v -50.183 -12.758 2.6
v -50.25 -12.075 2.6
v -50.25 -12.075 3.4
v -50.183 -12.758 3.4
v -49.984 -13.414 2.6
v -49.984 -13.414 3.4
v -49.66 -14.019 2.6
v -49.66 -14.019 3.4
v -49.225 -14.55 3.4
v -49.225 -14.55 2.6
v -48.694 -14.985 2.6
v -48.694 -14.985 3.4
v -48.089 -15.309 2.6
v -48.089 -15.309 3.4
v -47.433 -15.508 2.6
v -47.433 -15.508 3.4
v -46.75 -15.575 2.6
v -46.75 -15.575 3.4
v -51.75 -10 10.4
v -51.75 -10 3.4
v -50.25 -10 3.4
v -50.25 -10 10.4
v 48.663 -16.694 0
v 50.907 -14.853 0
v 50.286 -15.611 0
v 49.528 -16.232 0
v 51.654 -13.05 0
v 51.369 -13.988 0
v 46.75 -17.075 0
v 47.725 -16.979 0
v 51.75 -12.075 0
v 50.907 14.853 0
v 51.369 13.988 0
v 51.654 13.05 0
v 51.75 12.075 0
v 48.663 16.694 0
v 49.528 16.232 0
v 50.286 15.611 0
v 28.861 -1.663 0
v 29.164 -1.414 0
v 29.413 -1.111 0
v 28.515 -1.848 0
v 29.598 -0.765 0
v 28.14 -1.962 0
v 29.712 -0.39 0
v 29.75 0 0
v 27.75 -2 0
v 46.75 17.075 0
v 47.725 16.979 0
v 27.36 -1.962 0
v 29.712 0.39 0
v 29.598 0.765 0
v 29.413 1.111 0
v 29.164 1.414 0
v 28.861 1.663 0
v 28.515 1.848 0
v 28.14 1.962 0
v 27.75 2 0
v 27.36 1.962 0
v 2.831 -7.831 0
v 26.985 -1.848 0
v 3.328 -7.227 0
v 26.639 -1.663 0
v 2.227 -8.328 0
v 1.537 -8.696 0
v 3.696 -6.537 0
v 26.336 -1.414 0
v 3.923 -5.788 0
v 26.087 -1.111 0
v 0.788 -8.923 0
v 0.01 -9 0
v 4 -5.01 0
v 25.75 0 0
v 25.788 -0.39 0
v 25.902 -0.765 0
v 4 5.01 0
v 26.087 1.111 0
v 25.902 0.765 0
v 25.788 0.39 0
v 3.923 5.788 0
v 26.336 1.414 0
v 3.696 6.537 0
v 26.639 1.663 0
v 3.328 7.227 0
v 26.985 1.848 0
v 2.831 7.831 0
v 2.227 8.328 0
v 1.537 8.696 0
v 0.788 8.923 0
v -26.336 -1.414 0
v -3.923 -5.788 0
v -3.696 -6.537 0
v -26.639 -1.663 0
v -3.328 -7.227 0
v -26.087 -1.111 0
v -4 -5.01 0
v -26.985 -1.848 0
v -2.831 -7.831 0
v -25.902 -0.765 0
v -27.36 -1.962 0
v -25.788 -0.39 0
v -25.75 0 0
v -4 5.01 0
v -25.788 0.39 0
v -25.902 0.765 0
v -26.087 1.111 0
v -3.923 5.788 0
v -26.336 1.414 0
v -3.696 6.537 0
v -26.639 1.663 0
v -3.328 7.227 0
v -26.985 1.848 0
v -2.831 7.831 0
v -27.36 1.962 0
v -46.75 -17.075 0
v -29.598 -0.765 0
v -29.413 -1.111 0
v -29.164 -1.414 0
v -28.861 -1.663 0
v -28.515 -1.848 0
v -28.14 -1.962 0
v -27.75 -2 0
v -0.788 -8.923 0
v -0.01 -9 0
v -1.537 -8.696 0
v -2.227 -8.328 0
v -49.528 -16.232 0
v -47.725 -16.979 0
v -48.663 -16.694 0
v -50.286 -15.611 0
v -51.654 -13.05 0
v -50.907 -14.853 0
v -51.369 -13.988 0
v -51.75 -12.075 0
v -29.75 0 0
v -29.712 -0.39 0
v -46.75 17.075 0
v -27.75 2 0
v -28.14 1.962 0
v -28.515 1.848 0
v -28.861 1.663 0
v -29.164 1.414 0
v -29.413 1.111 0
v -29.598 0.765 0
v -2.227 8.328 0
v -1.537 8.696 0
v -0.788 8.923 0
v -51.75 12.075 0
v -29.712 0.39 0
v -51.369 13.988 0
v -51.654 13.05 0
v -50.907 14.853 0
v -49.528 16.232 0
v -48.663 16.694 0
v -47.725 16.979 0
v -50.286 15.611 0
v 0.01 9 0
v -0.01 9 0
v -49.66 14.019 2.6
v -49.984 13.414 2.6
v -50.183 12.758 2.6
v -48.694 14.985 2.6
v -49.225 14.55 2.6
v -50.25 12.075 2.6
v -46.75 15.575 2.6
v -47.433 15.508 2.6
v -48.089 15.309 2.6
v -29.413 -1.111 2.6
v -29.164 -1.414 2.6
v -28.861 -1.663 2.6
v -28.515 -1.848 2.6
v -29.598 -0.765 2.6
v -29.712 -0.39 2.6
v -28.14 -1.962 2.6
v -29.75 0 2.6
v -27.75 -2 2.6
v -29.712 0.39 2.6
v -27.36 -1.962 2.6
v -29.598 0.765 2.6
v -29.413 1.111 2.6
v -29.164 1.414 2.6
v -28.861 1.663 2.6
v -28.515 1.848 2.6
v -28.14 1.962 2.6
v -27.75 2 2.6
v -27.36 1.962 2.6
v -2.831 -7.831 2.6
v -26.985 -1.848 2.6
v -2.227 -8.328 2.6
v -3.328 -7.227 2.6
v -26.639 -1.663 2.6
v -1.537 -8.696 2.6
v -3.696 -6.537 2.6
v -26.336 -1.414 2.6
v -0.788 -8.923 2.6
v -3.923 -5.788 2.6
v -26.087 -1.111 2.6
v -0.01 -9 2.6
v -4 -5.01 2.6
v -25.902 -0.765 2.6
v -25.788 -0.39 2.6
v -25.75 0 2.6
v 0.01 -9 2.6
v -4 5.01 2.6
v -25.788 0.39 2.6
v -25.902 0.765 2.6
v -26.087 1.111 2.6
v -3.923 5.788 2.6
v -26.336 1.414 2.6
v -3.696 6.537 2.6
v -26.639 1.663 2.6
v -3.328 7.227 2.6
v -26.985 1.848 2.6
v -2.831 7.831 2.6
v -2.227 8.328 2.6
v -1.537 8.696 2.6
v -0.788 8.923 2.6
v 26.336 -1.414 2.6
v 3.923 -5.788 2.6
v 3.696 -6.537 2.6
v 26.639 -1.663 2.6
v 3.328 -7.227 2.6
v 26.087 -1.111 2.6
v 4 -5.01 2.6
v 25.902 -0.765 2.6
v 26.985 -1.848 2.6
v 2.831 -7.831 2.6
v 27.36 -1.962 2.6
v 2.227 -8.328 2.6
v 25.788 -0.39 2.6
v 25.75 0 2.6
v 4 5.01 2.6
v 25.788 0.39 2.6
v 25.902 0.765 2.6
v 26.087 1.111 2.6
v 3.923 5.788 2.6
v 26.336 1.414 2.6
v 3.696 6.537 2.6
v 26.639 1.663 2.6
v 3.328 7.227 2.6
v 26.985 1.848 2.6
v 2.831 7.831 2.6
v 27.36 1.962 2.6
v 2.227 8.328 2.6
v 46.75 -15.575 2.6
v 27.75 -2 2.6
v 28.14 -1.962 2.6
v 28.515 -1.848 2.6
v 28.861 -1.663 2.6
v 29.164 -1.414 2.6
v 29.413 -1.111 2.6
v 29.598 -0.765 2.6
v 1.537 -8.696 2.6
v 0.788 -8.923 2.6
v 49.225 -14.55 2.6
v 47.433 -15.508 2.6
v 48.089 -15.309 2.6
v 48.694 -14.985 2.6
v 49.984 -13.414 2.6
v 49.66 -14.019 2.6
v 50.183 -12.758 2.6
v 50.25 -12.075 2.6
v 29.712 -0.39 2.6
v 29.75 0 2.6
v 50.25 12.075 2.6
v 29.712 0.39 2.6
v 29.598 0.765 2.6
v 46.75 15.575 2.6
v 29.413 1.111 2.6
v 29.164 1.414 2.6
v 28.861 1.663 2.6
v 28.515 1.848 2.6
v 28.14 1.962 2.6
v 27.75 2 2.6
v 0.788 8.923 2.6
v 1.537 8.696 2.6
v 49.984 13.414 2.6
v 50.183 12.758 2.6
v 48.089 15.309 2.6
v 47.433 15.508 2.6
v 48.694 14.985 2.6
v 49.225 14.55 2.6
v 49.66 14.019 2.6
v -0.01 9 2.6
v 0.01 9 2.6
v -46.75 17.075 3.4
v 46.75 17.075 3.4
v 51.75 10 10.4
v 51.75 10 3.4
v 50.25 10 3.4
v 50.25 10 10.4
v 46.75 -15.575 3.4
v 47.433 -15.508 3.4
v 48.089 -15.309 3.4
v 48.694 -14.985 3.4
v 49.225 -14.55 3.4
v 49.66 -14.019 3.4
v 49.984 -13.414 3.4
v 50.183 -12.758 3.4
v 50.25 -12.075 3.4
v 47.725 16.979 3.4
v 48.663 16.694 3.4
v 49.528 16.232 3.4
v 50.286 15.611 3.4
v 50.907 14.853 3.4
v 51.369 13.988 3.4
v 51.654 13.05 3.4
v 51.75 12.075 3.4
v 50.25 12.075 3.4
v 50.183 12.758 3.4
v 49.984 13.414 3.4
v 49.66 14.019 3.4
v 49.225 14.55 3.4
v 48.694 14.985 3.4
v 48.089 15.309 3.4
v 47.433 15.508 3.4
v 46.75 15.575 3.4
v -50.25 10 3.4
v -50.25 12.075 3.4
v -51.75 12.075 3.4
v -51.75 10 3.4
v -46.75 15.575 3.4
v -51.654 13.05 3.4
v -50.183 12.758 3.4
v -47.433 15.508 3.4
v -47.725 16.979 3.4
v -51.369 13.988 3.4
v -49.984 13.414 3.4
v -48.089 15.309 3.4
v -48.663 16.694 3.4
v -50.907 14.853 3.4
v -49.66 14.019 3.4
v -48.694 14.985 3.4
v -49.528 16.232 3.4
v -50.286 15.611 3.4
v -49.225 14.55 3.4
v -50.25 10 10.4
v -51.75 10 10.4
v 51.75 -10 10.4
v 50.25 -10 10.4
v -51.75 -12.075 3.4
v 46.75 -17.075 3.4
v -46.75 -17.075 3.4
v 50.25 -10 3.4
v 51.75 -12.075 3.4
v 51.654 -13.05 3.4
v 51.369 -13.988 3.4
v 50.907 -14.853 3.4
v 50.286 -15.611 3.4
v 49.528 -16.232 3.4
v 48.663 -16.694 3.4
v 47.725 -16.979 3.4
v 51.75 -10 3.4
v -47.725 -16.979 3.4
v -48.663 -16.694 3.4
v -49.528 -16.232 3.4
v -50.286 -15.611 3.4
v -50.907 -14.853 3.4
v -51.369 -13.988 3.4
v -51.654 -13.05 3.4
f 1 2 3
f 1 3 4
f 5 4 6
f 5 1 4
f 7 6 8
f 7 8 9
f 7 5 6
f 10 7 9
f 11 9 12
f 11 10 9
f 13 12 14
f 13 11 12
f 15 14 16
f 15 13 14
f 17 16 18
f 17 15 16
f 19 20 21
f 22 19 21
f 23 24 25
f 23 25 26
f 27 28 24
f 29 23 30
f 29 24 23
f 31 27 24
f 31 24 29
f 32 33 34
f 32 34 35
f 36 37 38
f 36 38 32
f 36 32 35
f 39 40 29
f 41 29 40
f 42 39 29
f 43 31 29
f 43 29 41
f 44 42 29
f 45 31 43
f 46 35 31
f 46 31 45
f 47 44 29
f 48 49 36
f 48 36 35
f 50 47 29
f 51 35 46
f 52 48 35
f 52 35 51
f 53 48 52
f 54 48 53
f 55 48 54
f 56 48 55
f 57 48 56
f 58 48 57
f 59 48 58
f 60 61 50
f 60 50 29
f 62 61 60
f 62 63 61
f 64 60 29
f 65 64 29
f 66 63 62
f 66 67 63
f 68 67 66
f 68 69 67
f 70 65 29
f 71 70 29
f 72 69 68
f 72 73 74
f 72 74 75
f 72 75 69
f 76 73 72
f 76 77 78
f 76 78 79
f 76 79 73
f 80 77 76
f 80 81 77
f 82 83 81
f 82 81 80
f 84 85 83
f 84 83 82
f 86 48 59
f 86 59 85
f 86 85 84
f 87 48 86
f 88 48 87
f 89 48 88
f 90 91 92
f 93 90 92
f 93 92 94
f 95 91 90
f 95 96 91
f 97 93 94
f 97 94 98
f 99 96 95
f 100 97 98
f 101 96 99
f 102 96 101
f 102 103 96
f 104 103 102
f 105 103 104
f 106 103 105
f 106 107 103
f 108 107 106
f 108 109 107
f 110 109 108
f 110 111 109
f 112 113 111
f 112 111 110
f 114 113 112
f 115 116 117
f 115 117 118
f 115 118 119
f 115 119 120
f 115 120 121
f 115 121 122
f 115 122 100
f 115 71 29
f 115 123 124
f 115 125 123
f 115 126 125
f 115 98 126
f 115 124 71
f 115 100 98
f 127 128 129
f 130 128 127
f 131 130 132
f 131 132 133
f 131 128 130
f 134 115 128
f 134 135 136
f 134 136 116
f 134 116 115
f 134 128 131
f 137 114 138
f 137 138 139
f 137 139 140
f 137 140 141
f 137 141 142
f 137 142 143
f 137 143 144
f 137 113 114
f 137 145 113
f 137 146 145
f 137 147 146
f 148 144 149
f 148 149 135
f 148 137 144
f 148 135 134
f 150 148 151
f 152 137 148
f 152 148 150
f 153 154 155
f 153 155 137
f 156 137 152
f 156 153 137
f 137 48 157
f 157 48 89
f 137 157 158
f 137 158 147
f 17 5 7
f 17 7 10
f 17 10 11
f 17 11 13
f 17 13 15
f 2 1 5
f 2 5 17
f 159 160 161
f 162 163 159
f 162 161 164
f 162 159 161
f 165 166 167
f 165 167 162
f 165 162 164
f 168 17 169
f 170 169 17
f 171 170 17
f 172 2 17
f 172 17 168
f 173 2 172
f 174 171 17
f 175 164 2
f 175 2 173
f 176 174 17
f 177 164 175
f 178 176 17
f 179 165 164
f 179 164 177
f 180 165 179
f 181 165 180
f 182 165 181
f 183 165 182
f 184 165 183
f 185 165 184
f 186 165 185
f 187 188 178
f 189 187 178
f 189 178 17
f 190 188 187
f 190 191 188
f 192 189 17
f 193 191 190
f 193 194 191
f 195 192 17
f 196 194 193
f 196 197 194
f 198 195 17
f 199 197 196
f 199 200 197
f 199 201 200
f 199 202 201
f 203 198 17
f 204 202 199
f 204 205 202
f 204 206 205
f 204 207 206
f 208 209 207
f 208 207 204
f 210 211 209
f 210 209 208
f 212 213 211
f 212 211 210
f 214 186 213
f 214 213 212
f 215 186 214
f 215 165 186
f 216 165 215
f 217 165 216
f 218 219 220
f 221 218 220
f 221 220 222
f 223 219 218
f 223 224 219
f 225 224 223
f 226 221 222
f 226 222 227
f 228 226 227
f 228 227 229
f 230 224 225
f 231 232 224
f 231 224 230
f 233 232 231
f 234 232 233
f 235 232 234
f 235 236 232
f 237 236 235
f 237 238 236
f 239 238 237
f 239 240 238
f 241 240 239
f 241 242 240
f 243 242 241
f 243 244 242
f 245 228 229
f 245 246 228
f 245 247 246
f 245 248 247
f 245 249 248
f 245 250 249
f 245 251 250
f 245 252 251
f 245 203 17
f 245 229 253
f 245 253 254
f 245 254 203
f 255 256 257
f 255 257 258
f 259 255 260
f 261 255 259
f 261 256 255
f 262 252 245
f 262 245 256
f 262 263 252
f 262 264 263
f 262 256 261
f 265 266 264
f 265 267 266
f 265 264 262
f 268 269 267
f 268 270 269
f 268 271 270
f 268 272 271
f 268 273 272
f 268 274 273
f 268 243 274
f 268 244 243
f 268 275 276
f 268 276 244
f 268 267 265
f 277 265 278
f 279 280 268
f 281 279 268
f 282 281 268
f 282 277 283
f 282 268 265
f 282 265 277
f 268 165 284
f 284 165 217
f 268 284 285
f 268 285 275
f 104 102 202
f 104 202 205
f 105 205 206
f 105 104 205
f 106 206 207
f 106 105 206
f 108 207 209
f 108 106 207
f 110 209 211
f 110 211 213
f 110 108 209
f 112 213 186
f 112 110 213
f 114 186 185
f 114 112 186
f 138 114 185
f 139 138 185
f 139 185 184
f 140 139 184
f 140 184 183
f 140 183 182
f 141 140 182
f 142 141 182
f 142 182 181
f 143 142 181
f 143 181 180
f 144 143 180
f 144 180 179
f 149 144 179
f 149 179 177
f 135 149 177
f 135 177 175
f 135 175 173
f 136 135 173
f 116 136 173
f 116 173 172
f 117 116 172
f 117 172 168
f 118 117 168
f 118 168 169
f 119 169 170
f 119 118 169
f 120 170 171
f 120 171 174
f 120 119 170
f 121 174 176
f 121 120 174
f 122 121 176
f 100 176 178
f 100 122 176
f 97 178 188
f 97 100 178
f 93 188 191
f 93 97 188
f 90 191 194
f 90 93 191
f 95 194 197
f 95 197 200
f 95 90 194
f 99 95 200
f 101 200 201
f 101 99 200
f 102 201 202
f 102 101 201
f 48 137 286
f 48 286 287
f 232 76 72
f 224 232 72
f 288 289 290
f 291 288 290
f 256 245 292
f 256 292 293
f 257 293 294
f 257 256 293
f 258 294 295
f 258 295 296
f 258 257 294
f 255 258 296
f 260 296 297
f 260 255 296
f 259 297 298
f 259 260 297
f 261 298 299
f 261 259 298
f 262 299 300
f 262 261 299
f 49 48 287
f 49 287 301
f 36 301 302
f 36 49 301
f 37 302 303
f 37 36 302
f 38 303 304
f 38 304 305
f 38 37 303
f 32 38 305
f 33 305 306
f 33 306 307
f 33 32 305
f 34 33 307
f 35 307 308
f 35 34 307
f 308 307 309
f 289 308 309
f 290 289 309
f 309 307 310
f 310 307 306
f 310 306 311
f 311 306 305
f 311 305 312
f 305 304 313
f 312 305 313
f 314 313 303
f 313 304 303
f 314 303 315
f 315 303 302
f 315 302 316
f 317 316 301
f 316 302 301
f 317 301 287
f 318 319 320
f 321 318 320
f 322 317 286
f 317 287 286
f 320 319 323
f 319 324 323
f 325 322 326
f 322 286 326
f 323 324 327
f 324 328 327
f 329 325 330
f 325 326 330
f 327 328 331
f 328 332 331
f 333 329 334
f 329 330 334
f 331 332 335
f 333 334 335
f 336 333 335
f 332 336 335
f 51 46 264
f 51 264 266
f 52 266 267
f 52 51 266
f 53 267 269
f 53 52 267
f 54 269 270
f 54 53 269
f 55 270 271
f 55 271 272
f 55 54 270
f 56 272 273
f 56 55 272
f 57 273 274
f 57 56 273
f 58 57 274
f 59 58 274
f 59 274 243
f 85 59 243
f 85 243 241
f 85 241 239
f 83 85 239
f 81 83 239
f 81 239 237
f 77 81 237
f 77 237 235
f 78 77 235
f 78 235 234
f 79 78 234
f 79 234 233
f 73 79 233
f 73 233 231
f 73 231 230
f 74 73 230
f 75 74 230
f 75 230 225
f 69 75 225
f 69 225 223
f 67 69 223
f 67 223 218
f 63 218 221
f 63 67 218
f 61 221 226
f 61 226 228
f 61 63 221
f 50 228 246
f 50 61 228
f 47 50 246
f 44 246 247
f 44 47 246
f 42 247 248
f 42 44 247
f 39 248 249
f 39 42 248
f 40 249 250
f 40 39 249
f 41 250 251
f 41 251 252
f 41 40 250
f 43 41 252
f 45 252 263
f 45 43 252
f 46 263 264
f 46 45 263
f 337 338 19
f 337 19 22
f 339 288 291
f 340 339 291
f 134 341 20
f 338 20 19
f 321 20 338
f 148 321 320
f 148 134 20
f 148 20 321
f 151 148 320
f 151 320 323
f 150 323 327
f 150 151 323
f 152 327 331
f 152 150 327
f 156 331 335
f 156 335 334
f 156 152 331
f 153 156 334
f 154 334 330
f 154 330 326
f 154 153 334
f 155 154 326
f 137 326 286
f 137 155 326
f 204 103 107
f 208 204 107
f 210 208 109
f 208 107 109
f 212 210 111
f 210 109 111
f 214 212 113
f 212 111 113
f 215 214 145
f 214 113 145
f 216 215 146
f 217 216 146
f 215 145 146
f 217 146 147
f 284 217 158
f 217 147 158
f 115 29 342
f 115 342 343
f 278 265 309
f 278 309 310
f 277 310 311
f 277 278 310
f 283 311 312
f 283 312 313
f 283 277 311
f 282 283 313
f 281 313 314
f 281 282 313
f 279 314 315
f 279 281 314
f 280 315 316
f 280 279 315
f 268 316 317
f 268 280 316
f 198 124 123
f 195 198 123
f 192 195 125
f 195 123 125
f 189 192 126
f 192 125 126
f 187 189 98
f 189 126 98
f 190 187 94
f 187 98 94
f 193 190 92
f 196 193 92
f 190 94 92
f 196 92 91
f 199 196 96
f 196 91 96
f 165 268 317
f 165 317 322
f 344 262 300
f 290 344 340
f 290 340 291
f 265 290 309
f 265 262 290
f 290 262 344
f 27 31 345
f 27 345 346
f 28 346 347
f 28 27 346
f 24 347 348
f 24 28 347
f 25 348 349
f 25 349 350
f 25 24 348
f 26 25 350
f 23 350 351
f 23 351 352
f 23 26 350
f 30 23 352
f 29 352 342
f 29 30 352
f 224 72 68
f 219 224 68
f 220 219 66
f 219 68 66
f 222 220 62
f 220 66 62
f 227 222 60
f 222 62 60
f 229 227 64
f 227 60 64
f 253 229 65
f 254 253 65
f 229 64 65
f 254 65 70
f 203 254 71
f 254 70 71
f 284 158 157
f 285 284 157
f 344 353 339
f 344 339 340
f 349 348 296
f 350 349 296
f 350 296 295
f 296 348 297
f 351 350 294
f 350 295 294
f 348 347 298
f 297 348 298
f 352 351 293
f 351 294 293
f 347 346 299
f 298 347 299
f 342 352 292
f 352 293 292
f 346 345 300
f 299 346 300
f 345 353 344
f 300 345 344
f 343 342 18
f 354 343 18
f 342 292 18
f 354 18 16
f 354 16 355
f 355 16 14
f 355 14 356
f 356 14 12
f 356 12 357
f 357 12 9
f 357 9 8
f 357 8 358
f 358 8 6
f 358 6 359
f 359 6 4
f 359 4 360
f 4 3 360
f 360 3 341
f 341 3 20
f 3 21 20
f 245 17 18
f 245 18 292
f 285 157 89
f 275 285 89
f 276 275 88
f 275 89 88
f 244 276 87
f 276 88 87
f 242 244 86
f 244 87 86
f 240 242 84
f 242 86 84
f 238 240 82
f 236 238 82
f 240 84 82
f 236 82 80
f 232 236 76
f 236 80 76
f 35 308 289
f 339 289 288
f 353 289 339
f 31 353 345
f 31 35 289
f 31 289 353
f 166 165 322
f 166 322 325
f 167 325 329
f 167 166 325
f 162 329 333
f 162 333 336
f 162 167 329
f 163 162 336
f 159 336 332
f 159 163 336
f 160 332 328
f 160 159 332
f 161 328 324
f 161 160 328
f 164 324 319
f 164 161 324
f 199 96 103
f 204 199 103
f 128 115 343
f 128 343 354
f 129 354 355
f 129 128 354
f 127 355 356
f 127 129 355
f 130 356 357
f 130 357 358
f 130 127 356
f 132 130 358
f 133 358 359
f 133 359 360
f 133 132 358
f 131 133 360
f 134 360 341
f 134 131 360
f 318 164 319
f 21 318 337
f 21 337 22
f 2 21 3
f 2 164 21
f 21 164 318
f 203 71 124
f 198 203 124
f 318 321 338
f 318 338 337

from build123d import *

# Parameters (mm, degrees)
SKETCH1_R           = 2
BOSS_EXTRUDE1_DEPTH = 3.4
CUT_EXTRUDE1_START  = -0.8
SKETCH2_R           = 2
CUT_EXTRUDE1_DEPTH  = 0.8
SKETCH3_W           = 1.5
SKETCH3_H           = 20
BOSS_EXTRUDE2_DEPTH = 7


with BuildPart() as part:
    # Sketch1 → Boss-Extrude1 (new body)
    with BuildSketch(Plane.XY):
        with BuildLine():
            Line((-46.75, 17.075), (46.75, 17.075))
            ThreePointArc((46.75, 17.075), (50.285533906, 15.610533906), (51.75, 12.075))
            Line((51.75, 12.075), (51.75, -12.075))
            ThreePointArc((51.75, -12.075), (50.285533906, -15.610533906), (46.75, -17.075))
            Line((46.75, -17.075), (-46.75, -17.075))
            ThreePointArc((-46.75, -17.075), (-50.285533906, -15.610533906), (-51.75, -12.075))
            Line((-51.75, -12.075), (-51.75, 12.075))
            ThreePointArc((-51.75, 12.075), (-50.285533906, 15.610533906), (-46.75, 17.075))
        make_face()
        with Locations((-27.75, 0)):
            Circle(SKETCH1_R, mode=Mode.SUBTRACT)
        with Locations((27.75, 0)):
            Circle(SKETCH1_R, mode=Mode.SUBTRACT)
        with BuildLine():
            Line((-0.01, 9), (0.01, 9))
            ThreePointArc((0.01, 9), (2.831356057, 7.831356057), (4, 5.01))
            Line((4, 5.01), (4, -5.01))
            ThreePointArc((4, -5.01), (2.831356057, -7.831356057), (0.01, -9))
            Line((0.01, -9), (-0.01, -9))
            ThreePointArc((-0.01, -9), (-2.831356057, -7.831356057), (-4, -5.01))
            Line((-4, -5.01), (-4, 5.01))
            ThreePointArc((-4, 5.01), (-2.831356057, 7.831356057), (-0.01, 9))
        make_face(mode=Mode.SUBTRACT)
    extrude(amount=BOSS_EXTRUDE1_DEPTH)

    # Sketch2 → Cut-Extrude1 (cut)
    with BuildSketch(Plane.XY.offset(3.4).offset(CUT_EXTRUDE1_START)):
        with BuildLine():
            Line((50.25, -12.075), (50.25, 12.075))
            ThreePointArc((50.25, 12.075), (49.224873734, 14.549873734), (46.75, 15.575))
            Line((46.75, 15.575), (-46.75, 15.575))
            ThreePointArc((-46.75, 15.575), (-49.224873734, 14.549873734), (-50.25, 12.075))
            Line((-50.25, 12.075), (-50.25, -12.075))
            ThreePointArc((-50.25, -12.075), (-49.224873734, -14.549873734), (-46.75, -15.575))
            Line((-46.75, -15.575), (46.75, -15.575))
            ThreePointArc((46.75, -15.575), (49.224873734, -14.549873734), (50.25, -12.075))
        make_face()
        with Locations((-27.75, 0)):
            Circle(SKETCH2_R, mode=Mode.SUBTRACT)
        with Locations((27.75, 0)):
            Circle(SKETCH2_R, mode=Mode.SUBTRACT)
        with BuildLine():
            ThreePointArc((0.01, 9), (2.831356057, 7.831356057), (4, 5.01))
            Line((4, 5.01), (4, -5.01))
            ThreePointArc((4, -5.01), (2.831356057, -7.831356057), (0.01, -9))
            Line((0.01, -9), (-0.01, -9))
            ThreePointArc((-0.01, -9), (-2.831356057, -7.831356057), (-4, -5.01))
            Line((-4, -5.01), (-4, 5.01))
            ThreePointArc((-4, 5.01), (-2.831356057, 7.831356057), (-0.01, 9))
            Line((-0.01, 9), (0.01, 9))
        make_face(mode=Mode.SUBTRACT)
    extrude(amount=CUT_EXTRUDE1_DEPTH, mode=Mode.SUBTRACT)

    # Sketch3 → Boss-Extrude2 (add)
    with BuildSketch(Plane.XY.offset(3.4)):
        with Locations((-51, 0)):
            Rectangle(SKETCH3_W, SKETCH3_H)
    boss_extrude2 = extrude(amount=BOSS_EXTRUDE2_DEPTH)

    # Mirror1: Boss-Extrude2 across plane
    add(boss_extrude2.mirror(Plane(origin=(0, 0, 0), x_dir=(0, 0, 1), z_dir=(1, 0, 0))))


solid = part.part
